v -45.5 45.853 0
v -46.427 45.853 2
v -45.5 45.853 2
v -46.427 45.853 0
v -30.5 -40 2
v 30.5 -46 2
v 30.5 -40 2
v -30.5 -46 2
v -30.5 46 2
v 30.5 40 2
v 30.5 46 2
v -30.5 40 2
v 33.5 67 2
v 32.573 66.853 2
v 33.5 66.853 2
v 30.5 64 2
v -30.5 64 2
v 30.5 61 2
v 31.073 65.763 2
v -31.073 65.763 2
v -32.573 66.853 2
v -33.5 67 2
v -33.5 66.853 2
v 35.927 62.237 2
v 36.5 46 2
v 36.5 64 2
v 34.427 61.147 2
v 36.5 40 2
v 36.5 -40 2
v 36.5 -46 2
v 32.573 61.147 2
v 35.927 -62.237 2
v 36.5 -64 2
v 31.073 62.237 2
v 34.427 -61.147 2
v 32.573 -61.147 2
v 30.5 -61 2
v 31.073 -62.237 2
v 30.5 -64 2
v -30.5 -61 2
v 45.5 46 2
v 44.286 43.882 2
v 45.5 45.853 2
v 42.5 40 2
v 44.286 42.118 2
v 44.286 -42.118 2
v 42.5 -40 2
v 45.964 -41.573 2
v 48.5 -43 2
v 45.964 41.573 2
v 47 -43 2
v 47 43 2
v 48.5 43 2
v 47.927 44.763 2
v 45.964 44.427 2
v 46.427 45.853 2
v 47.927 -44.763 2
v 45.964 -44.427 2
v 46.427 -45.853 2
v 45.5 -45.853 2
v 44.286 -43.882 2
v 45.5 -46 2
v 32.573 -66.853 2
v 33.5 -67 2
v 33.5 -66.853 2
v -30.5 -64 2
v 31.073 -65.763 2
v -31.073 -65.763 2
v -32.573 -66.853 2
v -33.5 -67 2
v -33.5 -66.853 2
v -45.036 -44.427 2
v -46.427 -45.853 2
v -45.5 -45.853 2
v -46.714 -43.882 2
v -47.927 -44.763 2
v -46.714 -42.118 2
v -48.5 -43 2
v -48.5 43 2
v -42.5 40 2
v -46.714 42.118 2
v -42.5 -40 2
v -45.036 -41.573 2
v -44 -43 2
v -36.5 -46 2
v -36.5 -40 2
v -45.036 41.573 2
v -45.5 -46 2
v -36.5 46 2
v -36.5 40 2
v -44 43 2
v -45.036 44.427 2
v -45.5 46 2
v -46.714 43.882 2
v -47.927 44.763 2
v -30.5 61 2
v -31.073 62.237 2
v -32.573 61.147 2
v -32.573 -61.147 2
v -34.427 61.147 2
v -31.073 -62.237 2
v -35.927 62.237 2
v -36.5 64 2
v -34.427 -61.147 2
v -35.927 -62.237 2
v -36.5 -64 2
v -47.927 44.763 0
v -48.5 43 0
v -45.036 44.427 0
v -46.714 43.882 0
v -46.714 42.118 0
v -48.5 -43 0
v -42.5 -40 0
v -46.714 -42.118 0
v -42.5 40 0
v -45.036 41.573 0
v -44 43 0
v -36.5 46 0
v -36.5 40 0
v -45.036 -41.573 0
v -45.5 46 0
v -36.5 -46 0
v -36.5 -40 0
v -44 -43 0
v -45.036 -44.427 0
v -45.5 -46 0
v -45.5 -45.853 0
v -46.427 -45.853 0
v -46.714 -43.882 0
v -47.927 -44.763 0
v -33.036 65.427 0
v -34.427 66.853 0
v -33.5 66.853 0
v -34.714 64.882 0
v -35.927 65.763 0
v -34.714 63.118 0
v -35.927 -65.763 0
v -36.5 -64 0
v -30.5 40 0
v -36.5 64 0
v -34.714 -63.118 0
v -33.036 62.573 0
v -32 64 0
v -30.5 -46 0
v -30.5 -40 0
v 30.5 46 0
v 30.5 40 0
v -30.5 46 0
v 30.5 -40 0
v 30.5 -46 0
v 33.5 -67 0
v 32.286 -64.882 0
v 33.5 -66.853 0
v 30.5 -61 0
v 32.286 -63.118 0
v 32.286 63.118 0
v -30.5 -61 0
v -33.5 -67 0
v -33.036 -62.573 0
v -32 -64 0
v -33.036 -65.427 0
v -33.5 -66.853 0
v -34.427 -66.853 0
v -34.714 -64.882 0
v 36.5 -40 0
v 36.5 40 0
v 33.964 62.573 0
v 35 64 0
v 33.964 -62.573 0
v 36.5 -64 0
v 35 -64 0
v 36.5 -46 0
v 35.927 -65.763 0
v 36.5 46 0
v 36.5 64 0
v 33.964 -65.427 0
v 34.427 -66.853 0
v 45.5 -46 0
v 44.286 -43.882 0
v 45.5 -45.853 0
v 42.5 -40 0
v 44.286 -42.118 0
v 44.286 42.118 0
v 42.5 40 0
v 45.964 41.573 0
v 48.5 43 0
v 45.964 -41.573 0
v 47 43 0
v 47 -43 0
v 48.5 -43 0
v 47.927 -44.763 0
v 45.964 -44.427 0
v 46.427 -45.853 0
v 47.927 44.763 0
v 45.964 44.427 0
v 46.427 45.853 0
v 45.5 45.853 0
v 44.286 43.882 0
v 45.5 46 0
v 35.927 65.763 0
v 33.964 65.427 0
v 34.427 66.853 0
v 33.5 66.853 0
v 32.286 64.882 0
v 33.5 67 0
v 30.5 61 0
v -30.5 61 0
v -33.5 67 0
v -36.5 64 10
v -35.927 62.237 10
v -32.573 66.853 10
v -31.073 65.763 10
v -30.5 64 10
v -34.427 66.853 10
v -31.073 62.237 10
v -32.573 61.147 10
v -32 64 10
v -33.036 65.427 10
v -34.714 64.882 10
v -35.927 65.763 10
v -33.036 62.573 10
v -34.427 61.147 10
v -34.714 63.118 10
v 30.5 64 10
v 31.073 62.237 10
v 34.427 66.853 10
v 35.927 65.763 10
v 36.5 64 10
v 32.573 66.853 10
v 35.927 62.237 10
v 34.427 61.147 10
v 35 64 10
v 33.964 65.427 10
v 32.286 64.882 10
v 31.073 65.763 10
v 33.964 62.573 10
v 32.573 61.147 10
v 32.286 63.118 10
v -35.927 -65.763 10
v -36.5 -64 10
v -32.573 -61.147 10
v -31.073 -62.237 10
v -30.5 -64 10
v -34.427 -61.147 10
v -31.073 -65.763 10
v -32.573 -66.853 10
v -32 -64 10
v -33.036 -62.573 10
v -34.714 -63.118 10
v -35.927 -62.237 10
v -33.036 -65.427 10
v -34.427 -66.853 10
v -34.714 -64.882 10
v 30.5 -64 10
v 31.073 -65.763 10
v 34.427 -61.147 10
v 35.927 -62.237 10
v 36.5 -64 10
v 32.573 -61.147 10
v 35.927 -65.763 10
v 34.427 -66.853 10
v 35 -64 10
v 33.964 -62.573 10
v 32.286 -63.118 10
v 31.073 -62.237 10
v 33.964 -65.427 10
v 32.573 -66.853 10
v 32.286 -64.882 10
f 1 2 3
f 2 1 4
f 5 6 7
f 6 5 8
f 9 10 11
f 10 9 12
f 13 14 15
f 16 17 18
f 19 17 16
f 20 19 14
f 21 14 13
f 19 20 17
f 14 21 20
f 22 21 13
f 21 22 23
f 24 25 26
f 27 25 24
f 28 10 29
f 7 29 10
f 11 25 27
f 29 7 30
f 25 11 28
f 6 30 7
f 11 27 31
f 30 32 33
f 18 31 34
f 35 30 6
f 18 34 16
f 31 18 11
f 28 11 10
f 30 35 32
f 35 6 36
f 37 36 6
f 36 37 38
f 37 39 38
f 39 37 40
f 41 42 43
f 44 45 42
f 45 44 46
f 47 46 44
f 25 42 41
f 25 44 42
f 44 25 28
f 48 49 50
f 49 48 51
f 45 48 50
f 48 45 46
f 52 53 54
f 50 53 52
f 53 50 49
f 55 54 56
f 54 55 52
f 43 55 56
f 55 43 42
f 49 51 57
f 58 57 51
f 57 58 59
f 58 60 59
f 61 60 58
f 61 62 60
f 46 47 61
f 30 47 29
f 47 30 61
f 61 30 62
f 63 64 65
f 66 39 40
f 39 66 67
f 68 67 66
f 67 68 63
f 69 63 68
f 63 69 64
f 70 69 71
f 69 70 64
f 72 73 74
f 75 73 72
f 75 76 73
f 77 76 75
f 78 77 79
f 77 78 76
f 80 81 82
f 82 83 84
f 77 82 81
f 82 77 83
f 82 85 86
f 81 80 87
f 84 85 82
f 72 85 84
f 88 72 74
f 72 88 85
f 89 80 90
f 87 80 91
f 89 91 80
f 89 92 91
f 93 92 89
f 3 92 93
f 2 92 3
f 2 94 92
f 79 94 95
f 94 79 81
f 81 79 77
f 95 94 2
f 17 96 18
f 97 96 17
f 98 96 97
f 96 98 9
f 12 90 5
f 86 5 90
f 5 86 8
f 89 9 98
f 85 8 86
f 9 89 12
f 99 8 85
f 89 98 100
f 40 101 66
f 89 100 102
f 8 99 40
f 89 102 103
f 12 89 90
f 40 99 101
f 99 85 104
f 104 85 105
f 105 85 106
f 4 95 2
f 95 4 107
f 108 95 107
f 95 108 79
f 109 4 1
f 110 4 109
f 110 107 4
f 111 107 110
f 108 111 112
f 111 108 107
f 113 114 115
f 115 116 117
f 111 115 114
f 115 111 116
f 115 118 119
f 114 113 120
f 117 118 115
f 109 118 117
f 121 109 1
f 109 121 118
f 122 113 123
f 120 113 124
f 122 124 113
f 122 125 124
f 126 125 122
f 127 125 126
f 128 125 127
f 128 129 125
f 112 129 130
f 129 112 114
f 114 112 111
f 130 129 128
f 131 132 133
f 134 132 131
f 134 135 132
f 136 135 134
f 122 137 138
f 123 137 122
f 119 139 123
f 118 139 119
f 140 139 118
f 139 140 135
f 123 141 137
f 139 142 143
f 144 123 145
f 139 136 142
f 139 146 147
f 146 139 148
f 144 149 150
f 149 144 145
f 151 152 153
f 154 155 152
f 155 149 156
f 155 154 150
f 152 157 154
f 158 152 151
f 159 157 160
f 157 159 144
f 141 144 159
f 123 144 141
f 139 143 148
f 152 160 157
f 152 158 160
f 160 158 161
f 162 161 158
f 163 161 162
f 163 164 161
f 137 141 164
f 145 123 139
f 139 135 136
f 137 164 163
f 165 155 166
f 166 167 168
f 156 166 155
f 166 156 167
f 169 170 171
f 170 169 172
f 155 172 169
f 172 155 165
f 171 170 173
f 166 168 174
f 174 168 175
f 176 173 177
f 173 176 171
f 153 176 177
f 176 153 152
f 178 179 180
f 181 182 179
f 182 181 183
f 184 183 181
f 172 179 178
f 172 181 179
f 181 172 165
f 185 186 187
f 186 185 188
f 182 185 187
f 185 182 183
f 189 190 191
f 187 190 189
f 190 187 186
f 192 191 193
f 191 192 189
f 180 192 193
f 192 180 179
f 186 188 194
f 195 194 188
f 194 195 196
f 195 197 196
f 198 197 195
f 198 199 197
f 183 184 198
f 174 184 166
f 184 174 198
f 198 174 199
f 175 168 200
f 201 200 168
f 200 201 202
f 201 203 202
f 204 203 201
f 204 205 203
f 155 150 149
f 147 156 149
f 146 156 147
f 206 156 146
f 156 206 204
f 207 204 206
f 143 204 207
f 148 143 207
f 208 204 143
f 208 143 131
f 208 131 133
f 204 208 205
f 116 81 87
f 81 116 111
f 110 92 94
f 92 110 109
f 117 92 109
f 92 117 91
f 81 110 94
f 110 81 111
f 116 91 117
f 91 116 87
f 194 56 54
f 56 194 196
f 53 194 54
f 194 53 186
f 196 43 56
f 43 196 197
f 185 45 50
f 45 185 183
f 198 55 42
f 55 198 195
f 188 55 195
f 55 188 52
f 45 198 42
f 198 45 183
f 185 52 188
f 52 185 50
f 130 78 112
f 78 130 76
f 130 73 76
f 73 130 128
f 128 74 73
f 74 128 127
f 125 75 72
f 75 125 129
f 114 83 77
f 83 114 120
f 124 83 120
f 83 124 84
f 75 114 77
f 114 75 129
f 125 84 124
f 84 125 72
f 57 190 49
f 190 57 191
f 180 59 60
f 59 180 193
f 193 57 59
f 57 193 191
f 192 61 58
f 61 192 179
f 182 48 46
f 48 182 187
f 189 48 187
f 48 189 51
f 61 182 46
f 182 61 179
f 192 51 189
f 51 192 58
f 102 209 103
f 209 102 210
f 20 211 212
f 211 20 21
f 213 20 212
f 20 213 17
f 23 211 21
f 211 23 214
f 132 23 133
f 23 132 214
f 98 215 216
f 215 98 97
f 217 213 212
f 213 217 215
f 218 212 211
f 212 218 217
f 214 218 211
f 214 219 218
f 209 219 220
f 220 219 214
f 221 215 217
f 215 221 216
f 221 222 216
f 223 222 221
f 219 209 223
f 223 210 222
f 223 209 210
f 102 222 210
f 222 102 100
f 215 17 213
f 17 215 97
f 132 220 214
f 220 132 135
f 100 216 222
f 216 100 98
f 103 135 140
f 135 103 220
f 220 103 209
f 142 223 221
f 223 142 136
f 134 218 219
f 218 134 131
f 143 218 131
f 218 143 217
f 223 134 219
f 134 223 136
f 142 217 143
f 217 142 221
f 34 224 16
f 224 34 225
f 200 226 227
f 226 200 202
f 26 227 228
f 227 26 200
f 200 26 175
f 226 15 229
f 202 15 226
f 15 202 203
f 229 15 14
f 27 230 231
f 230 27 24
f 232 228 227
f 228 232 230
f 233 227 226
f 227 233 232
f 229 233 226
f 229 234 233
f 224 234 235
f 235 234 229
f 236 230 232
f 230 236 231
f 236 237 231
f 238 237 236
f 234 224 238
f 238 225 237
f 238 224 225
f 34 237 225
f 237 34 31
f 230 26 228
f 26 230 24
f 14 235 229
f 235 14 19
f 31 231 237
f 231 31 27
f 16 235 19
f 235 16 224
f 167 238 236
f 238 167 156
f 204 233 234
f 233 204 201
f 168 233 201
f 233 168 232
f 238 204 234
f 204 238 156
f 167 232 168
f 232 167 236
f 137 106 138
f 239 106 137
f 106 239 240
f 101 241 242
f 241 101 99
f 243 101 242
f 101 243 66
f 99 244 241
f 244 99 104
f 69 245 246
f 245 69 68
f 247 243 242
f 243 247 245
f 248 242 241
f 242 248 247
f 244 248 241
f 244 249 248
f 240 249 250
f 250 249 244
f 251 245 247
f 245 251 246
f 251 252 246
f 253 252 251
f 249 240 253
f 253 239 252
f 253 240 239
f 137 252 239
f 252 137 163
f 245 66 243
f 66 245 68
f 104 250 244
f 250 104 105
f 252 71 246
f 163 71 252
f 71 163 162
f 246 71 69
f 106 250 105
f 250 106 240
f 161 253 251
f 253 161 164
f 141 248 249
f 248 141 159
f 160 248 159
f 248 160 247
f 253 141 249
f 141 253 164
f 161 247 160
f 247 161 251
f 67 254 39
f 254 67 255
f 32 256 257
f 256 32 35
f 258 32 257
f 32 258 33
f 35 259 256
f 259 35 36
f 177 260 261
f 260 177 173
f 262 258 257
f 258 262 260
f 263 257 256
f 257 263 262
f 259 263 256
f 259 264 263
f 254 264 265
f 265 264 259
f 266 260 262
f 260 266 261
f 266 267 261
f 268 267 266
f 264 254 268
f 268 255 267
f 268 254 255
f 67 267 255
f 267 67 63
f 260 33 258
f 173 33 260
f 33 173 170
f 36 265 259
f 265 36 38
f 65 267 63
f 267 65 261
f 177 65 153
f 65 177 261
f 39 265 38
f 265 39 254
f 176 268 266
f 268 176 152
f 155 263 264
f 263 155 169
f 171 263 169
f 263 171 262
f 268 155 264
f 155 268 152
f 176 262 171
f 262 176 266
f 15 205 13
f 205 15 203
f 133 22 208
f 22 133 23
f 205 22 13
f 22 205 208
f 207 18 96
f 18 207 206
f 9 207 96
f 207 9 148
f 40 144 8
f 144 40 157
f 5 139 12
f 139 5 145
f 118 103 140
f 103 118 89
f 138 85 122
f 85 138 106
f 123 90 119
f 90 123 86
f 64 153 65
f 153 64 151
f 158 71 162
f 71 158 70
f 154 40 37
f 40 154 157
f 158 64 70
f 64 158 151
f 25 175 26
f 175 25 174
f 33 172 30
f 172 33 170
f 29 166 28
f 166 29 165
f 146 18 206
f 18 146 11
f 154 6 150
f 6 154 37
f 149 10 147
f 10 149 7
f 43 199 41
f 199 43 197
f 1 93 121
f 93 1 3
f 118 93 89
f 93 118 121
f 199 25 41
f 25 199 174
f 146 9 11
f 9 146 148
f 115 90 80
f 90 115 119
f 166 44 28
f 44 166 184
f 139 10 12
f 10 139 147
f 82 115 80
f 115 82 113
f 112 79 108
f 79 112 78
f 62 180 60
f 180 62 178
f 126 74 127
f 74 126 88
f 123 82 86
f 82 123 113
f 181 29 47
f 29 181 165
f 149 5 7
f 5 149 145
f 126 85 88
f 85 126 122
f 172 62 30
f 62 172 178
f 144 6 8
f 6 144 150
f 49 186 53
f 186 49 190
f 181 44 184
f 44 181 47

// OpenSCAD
/* [Basic] */
// Horizontal Distance of the outer holes, measured from center of hole
outerHorizontalDistance = 91; // [0:500]
// Vertical Distance of the outer holes, measured from center of hole
outerVerticalDistance = 86; // [0:500]

// Horizontal Distance of the inner holes, measured from center of hole
innerHorizontalDistance = 67; // [0:500]
// Vertical Distance of the inner holes, measured from center of hole
innerVerticalDistance = 128; // [0:500]

// Diameter of the screw used for the outer hole
outerScrewDiameter = 3; // [1:10]
// Diameter of the screw used for the inner hole
innerScrewDiameter = 3; // [1:10]

// Height of the distancers for the outer hole
outerDistanceHeight = 2; // [1:20]
// Height of the distancers for the inner hole
innerDistanceHeight = 10; // [1:20]

// Height of the struts
strutHeight = 2; // [1:20]

// Strut mode
strutMode = 0; // [0: simple, 1: complex, 2: both]

/* [Expert] */
// X Offset of the Top Left outer hole
outerTLOffsetX = 0; // [-500:500]
// Y Offset of the Top Left outer hole
outerTLOffsetY = 0; // [-500:500]
// X Offset of the Top Right outer hole
outerTROffsetX = 0; // [-500:500]
// Y Offset of the Top Right outer hole
outerTROffsetY = 0; // [-500:500]
// X Offset of the Bottom Left outer hole
outerBLOffsetX = 0; // [-500:500]
// Y Offset of the Bottom Left outer hole
outerBLOffsetY = 0; // [-500:500]
// X Offset of the Bottom Right outer hole
outerBROffsetX = 0; // [-500:500]
// Y Offset of the Bottom Right outer hole
outerBROffsetY = 0; // [-500:500]

// X Offset of the Top Left inner hole
innerTLOffsetX = 0; // [-500:500]
// Y Offset of the Top Left inner hole
innerTLOffsetY = 0; // [-500:500]
// X Offset of the Top Right inner hole
innerTROffsetX = 0; // [-500:500]
// Y Offset of the Top Right inner hole
innerTROffsetY = 0; // [-500:500]
// X Offset of the Bottom Left inner hole
innerBLOffsetX = 0; // [-500:500]
// Y Offset of the Bottom Left inner hole
innerBLOffsetY = 0; // [-500:500]
// X Offset of the Bottom Right inner hole (-32 for a RUMBA board)
innerBROffsetX = 0;  // [-500:500]
// Y Offset of the Bottom Right inner hole
innerBROffsetY = 0; // [-500:500]

module screwHole(outerRadius, innerRadius, height){
    difference(){
        cylinder(r=outerRadius,h=height);
        translate([0,0,-1]){
            cylinder(r=innerRadius,h=height+2);
        }
    }
}

function outerHoleTL() = [-outerHorizontalDistance/2+outerTLOffsetX,outerVerticalDistance/2+outerTLOffsetY,0];
function outerHoleTR() = [outerHorizontalDistance/2+outerTROffsetX,outerVerticalDistance/2+outerTROffsetY,0];
function outerHoleBL() = [-outerHorizontalDistance/2+outerBLOffsetX,-outerVerticalDistance/2+outerBLOffsetY,0];
function outerHoleBR() = [outerHorizontalDistance/2+outerBROffsetX,-outerVerticalDistance/2+outerBROffsetY,0];

module outerHoles(){
    translate(outerHoleTL())
        screwHole(outerScrewDiameter,outerScrewDiameter/2,outerDistanceHeight);
    translate(outerHoleTR())
        screwHole(outerScrewDiameter,outerScrewDiameter/2,outerDistanceHeight);
    translate(outerHoleBL())
        screwHole(outerScrewDiameter,outerScrewDiameter/2,outerDistanceHeight);
    translate(outerHoleBR())
        screwHole(outerScrewDiameter,outerScrewDiameter/2,outerDistanceHeight);
}

function innerHoleTL() = [-innerHorizontalDistance/2+innerTLOffsetX,innerVerticalDistance/2+innerTLOffsetY,0];
function innerHoleTR() = [innerHorizontalDistance/2+innerTROffsetX,innerVerticalDistance/2+innerTROffsetY,0];
function innerHoleBL() = [-innerHorizontalDistance/2+innerBLOffsetX,-innerVerticalDistance/2+innerBLOffsetY,0];
function innerHoleBR() = [innerHorizontalDistance/2+innerBROffsetX,-innerVerticalDistance/2+innerBROffsetY,0];

module innerHoles(){
    translate(innerHoleTL())
        screwHole(innerScrewDiameter,innerScrewDiameter/2,innerDistanceHeight);
    translate(innerHoleTR())
        screwHole(innerScrewDiameter,innerScrewDiameter/2,innerDistanceHeight);
    translate(innerHoleBL())
        screwHole(innerScrewDiameter,innerScrewDiameter/2,innerDistanceHeight);
    translate(innerHoleBR())
        screwHole(innerScrewDiameter,innerScrewDiameter/2,innerDistanceHeight);
}

module strutsInner(){
    translate(innerHoleTL()+[0,-innerScrewDiameter,0])
        difference(){
            cube(size=[innerHorizontalDistance,innerScrewDiameter*2,strutHeight]);
            union(){
                translate([0,innerScrewDiameter,-1])
                    cylinder(r=innerScrewDiameter/2,h=strutHeight+2);
                translate([innerHorizontalDistance-innerTROffsetX,innerScrewDiameter,-1])
                    cylinder(r=innerScrewDiameter/2,h=strutHeight+2);
            }
        }

    translate(innerHoleBL()+[-innerScrewDiameter,0,0])
        difference(){
            cube(size=[innerScrewDiameter*2,innerVerticalDistance,strutHeight]);
            union(){
                translate([innerScrewDiameter,0,-1])
                    cylinder(r=innerScrewDiameter/2,h=strutHeight+2);
                translate([innerScrewDiameter,innerVerticalDistance,-1])
                    cylinder(r=innerScrewDiameter/2,h=strutHeight+2);
            }
        }

    translate(innerHoleBL()+[0,-innerScrewDiameter,0])
        difference(){
            cube(size=[innerHorizontalDistance+innerBROffsetX,innerScrewDiameter*2,strutHeight]);
            union(){
                translate([0,innerScrewDiameter,-1])
                    cylinder(r=innerScrewDiameter/2,h=strutHeight+2);
                translate([innerHorizontalDistance+innerBROffsetX,innerScrewDiameter,-1])
                    cylinder(r=innerScrewDiameter/2,h=strutHeight+2);
            }
        }

    translate(innerHoleBR()+[-innerScrewDiameter,0,0])
        difference(){
            cube(size=[innerScrewDiameter*2,innerVerticalDistance,strutHeight]);
            union(){
                translate([innerScrewDiameter,0,-1])
                    cylinder(r=innerScrewDiameter/2,h=strutHeight+2);
                translate([innerScrewDiameter,innerVerticalDistance,-1])
                    cylinder(r=innerScrewDiameter/2,h=strutHeight+2);
            }
        }
}

module strutsOuter(){
    translate(outerHoleTL()+[0,-outerScrewDiameter,0])
        difference(){
            cube(size=[outerHorizontalDistance,outerScrewDiameter*2,strutHeight]);
            union(){
                translate([0,outerScrewDiameter,-1])
                    cylinder(r=outerScrewDiameter/2,h=strutHeight+2);
                translate([outerHorizontalDistance-outerTROffsetX,outerScrewDiameter,-1])
                    cylinder(r=outerScrewDiameter/2,h=strutHeight+2);
            }
        }

    translate(outerHoleBL()+[-outerScrewDiameter,0,0])
        difference(){
            cube(size=[outerScrewDiameter*2,outerVerticalDistance,strutHeight]);
            union(){
                translate([outerScrewDiameter,0,-1])
                    cylinder(r=outerScrewDiameter/2,h=strutHeight+2);
                translate([outerScrewDiameter,outerVerticalDistance,-1])
                    cylinder(r=outerScrewDiameter/2,h=strutHeight+2);
            }
        }

    translate(outerHoleBL()+[0,-outerScrewDiameter,0])
        difference(){
            cube(size=[outerHorizontalDistance+outerBROffsetX,outerScrewDiameter*2,strutHeight]);
            union(){
                translate([0,outerScrewDiameter,-1])
                    cylinder(r=outerScrewDiameter/2,h=strutHeight+2);
                translate([outerHorizontalDistance+outerBROffsetX,outerScrewDiameter,-1])
                    cylinder(r=outerScrewDiameter/2,h=strutHeight+2);
            }
        }

    translate(outerHoleBR()+[-outerScrewDiameter,0,0])
        difference(){
            cube(size=[outerScrewDiameter*2,outerVerticalDistance,strutHeight]);
            union(){
                translate([outerScrewDiameter,0,-1])
                    cylinder(r=outerScrewDiameter/2,h=strutHeight+2);
                translate([outerScrewDiameter,outerVerticalDistance,-1])
                    cylinder(r=outerScrewDiameter/2,h=strutHeight+2);
            }
        }
}
module complexStrut(src, dst, srcxoff, srcyoff, dstxoff, dstyoff, srcHole, dstHole){
    CubePoints = [
        src + [srcxoff,-srcyoff,0],
        src + [-srcxoff,srcyoff,0],
        dst + [-dstxoff,dstyoff,0],
        dst + [dstxoff,-dstyoff,0],
        src + [srcxoff,-srcyoff,strutHeight],
        src + [-srcxoff,srcyoff,strutHeight],
        dst + [-dstxoff,dstyoff,strutHeight],
        dst + [dstxoff,-dstyoff,strutHeight]
    ];
    CubeFaces = [
        [0,1,2,3], // bottom
        [4,5,1,0],  // front
        [7,6,5,4],  // top
        [5,6,2,1],  // right
        [6,7,3,2],  // back
        [7,4,0,3] // left
    ];
    difference(){
        polyhedron(CubePoints, CubeFaces);
        union(){
            translate(src+[0,0,-1])
                cylinder(r=srcHole,h=strutHeight+2);
            translate(dst+[0,0,-1])
                cylinder(r=dstHole,h=strutHeight+2);
        }
    }
}
module struts(){
    if (strutMode == 0 || strutMode == 2){
        strutsInner();
        strutsOuter();
    }
    if (strutMode == 1 || strutMode == 2){
        for(src = [ innerHoleTR(), innerHoleTL(), innerHoleBR(), innerHoleBL()]){
            for (dst = [outerHoleTR(), outerHoleTL(), outerHoleBR(), outerHoleBL()]){
                complexStrut(src, dst,
                    (src[0] < dst[0] ? -1 : 1) * innerScrewDiameter/2,
                    (src[1] < dst[1] ? -1 : 1) * innerScrewDiameter/2,
                    (src[0] < dst[0] ? -1 : 1) * outerScrewDiameter/2,
                    (src[1] < dst[1] ? -1 : 1) * outerScrewDiameter/2,
                    innerScrewDiameter, outerScrewDiameter
                );
            }
        }
    }
}
outerHoles();
innerHoles();
struts();
